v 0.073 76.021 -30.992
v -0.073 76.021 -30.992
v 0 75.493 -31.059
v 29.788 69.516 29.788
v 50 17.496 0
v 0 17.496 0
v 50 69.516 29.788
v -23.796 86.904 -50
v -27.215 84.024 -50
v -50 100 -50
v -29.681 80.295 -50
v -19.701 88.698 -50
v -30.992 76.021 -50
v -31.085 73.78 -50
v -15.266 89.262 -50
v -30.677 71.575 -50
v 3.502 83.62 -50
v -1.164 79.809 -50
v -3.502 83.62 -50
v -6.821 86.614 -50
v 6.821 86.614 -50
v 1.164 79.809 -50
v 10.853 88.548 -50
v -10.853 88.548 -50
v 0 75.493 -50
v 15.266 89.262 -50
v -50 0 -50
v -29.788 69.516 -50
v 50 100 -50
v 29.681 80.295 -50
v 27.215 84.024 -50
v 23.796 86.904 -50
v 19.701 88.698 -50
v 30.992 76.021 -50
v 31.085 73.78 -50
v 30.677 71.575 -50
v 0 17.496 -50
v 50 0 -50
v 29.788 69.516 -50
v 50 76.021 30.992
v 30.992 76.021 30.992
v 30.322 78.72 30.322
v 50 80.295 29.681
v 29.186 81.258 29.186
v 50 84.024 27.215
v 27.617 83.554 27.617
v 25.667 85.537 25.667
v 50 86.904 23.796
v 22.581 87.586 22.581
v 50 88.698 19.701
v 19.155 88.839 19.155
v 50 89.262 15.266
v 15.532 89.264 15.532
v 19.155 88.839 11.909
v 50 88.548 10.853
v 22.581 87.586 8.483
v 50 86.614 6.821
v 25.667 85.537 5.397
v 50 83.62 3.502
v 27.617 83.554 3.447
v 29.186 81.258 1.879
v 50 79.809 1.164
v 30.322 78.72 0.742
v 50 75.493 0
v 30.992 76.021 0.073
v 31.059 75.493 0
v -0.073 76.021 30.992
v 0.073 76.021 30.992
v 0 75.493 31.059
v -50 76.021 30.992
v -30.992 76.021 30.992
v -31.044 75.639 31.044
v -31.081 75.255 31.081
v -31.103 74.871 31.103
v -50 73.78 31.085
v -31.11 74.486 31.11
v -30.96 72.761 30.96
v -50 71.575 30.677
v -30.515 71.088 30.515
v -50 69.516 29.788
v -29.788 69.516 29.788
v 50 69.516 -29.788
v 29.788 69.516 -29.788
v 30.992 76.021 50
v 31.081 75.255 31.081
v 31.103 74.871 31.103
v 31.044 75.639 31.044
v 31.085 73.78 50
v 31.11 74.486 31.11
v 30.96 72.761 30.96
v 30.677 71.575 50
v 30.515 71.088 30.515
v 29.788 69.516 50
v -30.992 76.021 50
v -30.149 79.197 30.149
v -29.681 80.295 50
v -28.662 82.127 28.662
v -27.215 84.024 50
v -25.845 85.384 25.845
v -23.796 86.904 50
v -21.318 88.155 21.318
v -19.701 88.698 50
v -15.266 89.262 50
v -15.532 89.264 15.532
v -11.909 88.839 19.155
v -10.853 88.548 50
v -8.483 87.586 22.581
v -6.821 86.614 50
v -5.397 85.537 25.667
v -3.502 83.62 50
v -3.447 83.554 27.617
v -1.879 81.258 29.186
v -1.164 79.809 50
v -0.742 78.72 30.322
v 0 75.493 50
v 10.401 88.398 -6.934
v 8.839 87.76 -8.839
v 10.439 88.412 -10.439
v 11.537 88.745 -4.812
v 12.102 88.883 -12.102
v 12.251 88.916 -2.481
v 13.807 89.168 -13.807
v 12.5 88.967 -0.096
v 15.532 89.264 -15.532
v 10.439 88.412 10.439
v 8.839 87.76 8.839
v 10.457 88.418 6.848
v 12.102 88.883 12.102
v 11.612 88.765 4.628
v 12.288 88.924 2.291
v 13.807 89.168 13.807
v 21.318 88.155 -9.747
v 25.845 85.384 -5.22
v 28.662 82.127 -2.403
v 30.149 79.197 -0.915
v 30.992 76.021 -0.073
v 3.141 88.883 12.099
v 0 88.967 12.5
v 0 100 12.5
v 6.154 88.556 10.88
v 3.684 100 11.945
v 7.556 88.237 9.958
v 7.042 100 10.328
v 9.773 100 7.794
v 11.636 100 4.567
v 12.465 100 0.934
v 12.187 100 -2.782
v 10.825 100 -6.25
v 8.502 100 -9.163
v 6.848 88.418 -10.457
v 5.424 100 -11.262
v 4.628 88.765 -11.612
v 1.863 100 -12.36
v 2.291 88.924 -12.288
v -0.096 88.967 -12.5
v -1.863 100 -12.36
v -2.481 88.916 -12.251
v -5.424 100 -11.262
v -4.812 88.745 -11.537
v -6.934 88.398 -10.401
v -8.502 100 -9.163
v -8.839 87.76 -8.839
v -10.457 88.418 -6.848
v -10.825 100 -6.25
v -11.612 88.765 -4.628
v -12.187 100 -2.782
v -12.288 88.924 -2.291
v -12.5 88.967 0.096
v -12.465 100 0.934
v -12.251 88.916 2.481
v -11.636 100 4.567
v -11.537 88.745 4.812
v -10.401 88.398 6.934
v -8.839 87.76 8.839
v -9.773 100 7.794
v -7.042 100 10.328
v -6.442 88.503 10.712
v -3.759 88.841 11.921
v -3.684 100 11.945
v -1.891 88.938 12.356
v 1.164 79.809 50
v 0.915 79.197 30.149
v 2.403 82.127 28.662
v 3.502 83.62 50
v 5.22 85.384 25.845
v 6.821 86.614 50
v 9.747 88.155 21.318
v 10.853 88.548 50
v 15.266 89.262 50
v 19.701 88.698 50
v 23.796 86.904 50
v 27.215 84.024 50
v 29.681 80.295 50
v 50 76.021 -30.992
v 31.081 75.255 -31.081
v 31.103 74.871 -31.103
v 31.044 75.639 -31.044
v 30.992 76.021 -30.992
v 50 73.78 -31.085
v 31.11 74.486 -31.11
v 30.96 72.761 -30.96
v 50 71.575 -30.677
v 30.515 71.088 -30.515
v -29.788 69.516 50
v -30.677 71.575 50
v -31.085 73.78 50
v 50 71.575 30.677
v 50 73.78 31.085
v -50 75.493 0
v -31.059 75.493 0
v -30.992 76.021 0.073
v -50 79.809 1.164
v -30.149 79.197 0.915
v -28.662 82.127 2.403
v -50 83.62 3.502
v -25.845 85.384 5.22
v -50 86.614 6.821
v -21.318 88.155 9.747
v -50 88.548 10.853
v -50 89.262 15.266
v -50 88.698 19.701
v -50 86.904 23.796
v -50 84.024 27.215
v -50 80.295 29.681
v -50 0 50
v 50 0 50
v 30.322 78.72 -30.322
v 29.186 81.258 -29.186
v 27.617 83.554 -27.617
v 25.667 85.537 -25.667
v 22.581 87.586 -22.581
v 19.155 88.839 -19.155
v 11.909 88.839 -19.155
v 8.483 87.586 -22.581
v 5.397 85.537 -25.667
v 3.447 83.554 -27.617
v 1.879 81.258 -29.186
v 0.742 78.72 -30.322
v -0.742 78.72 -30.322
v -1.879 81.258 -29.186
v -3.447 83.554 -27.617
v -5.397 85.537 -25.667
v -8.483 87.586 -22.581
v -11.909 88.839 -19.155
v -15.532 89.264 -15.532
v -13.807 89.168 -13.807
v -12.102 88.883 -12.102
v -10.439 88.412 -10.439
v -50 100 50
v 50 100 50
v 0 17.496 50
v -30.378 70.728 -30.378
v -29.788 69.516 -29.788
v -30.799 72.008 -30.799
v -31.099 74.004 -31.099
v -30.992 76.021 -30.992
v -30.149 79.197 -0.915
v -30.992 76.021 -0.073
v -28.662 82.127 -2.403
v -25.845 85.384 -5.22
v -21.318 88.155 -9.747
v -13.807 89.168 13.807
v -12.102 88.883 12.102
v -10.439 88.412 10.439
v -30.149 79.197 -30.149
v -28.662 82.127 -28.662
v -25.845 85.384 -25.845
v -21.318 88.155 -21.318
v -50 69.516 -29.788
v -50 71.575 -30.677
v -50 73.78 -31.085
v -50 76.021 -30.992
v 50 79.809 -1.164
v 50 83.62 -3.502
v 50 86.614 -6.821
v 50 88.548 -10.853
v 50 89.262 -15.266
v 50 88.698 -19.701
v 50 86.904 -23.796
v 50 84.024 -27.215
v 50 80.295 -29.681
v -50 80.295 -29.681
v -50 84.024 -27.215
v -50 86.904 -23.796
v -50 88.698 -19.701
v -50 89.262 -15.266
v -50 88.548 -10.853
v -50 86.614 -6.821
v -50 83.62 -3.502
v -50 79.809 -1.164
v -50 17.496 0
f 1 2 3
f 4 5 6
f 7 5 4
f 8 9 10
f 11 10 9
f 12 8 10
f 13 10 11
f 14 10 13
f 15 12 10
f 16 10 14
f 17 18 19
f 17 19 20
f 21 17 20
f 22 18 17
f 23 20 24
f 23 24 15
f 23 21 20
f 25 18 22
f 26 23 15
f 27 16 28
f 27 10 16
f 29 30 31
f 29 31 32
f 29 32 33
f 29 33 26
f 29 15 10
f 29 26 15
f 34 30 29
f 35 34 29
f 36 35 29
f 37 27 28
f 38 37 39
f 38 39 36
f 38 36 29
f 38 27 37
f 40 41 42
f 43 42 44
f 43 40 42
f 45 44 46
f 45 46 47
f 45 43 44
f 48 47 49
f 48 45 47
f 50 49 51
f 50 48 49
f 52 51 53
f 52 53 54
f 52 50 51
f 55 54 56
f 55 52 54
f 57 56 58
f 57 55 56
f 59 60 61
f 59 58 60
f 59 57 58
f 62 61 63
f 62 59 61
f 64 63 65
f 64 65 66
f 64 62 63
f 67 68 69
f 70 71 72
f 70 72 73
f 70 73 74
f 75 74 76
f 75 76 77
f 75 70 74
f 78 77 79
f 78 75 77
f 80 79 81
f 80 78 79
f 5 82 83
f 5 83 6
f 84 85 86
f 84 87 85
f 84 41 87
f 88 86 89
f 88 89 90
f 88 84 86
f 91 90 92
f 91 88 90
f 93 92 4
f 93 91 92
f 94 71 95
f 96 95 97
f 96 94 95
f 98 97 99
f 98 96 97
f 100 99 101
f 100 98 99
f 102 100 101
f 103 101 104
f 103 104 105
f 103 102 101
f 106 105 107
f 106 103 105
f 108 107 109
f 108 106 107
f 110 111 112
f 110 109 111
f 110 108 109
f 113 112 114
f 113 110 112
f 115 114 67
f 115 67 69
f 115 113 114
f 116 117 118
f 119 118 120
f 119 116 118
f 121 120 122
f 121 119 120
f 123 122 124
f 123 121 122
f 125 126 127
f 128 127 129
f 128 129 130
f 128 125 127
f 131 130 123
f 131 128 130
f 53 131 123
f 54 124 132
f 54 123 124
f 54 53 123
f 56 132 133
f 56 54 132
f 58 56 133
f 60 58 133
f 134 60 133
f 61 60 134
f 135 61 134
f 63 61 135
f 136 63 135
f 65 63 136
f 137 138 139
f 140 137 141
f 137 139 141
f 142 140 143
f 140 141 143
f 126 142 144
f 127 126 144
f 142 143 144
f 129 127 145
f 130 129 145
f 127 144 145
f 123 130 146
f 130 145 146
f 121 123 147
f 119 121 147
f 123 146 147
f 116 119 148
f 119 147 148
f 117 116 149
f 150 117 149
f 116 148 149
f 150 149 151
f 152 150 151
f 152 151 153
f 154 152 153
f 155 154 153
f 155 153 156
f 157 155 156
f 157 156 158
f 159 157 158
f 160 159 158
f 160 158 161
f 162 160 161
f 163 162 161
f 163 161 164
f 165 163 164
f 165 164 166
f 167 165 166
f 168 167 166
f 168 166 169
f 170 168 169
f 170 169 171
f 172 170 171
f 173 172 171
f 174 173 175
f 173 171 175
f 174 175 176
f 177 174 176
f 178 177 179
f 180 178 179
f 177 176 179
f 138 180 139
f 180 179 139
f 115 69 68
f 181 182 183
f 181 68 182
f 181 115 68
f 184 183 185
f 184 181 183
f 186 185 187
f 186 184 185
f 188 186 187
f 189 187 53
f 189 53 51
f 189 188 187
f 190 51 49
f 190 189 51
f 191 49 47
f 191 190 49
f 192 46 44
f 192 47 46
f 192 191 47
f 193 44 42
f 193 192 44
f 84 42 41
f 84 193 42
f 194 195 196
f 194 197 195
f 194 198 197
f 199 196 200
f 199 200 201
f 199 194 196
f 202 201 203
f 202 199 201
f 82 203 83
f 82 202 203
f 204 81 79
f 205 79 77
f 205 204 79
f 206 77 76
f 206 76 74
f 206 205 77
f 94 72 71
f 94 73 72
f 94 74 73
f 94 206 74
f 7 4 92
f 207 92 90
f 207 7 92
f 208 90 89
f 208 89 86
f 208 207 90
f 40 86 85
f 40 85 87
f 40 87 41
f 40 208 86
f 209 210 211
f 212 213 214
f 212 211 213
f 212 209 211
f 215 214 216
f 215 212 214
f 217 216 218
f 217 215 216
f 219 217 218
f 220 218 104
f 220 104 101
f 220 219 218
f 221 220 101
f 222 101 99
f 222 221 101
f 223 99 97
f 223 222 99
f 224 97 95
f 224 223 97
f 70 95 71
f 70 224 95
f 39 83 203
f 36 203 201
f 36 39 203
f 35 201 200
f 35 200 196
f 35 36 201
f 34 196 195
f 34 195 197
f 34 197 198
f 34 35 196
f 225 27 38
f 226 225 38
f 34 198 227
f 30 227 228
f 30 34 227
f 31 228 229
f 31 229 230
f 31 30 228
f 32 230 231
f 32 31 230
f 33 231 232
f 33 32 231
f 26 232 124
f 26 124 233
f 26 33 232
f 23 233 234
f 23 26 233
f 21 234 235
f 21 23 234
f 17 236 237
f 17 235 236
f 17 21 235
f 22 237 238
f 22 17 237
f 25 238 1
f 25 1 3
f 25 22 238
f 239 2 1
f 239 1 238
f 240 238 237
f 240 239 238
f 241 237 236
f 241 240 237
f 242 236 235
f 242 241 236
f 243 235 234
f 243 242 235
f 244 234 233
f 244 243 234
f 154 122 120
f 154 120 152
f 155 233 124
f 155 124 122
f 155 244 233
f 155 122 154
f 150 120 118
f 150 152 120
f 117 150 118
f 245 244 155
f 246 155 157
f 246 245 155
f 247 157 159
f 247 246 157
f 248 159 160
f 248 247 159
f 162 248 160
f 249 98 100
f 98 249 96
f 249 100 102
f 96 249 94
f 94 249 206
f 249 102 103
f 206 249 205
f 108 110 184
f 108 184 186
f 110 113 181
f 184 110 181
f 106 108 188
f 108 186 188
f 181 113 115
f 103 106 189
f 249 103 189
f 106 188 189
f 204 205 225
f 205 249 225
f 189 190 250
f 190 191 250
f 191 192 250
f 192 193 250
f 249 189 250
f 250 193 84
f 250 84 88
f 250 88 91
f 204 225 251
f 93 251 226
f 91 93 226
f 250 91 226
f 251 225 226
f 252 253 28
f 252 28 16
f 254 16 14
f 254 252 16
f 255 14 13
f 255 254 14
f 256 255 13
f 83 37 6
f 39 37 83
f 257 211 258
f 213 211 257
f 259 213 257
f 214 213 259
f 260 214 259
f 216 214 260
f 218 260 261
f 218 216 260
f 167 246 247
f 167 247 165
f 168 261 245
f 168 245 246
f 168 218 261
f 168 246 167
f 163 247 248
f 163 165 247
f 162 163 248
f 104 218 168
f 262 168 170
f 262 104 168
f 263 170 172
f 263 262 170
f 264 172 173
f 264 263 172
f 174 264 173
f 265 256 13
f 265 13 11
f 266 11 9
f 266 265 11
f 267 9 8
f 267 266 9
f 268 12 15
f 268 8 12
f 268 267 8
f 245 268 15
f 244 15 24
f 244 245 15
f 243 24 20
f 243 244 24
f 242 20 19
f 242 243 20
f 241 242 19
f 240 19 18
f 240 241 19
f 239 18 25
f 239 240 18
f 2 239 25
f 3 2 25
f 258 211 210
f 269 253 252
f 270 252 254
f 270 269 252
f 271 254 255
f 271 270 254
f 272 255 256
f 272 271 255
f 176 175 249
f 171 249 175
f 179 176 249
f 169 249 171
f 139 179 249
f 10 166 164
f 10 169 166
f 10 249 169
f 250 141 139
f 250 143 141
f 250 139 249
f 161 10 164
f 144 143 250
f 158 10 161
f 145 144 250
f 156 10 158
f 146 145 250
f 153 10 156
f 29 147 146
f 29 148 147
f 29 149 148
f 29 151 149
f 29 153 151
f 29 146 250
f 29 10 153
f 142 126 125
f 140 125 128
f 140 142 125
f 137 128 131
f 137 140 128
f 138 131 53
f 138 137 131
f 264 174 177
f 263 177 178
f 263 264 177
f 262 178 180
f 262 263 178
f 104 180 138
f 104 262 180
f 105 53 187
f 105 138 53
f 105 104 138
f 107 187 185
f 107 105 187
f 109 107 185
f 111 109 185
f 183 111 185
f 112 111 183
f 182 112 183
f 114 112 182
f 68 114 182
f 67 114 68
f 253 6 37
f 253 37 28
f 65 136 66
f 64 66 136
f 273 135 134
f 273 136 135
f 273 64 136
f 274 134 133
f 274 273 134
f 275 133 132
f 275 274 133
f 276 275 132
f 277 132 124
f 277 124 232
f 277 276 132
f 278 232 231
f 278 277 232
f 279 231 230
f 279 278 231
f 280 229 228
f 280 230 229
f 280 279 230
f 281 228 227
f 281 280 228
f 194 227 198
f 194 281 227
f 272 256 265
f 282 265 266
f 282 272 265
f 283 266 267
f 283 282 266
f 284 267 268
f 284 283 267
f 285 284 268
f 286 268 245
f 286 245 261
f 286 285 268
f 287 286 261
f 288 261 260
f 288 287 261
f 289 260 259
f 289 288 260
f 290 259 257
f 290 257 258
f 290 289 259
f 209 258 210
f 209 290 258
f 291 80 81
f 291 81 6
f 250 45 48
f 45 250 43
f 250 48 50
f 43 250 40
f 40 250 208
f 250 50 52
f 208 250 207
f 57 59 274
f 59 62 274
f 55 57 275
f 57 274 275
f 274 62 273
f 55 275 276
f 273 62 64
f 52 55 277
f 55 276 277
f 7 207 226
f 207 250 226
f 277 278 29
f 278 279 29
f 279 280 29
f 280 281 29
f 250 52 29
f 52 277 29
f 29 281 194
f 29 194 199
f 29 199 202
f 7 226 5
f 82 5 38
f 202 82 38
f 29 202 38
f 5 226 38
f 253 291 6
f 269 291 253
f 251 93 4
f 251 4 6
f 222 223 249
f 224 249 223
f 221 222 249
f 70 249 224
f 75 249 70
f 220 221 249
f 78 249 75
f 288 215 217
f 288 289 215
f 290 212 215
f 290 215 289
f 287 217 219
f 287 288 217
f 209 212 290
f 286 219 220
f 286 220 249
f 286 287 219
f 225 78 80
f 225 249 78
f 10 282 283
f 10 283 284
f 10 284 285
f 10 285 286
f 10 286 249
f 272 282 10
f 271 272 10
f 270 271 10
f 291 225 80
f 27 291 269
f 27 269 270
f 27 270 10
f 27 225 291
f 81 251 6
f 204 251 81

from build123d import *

# Parameters (mm, degrees)
SKETCH1_W           = 100
SKETCH1_H           = 100
BOSS_EXTRUDE1_DEPTH = 100
CUT_EXTRUDE1_DEPTH  = 50
CIRPATTERN2_COUNT   = 4
SKETCH3_R           = 12.5
CUT_EXTRUDE2_DEPTH  = 50


with BuildPart() as part:
    # Sketch1 → Boss-Extrude1 (new body)
    with BuildSketch(Plane(origin=(0, 0, 0), x_dir=(1, 0, 0), z_dir=(0, 1, 0))):
        Rectangle(SKETCH1_W, SKETCH1_H)
    extrude(amount=BOSS_EXTRUDE1_DEPTH)

    # Sketch2 → Cut-Extrude1 (cut)
    with BuildSketch(Plane.XY.offset(50)):
        with BuildLine():
            Line((0, 17.495781671), (-29.788286543, 69.516301586))
            ThreePointArc((-29.788286543, 69.516301586), (-30.943422674, 72.666080294), (-30.99180085, 76.020645087))
            ThreePointArc((-30.99180085, 76.020645087), (-15.265826761, 89.261609896), (0, 75.492661373))
            ThreePointArc((0, 75.492661373), (15.265826761, 89.261609896), (30.99180085, 76.020645087))
            ThreePointArc((30.99180085, 76.020645087), (30.943422674, 72.666080294), (29.788286543, 69.516301586))
            Line((29.788286543, 69.516301586), (0, 17.495781671))
        make_face()
    cut_extrude1 = extrude(amount=-CUT_EXTRUDE1_DEPTH, mode=Mode.SUBTRACT)

    # CirPattern2: Cut-Extrude1 ×4 about axis
    cirpattern2_axis = Axis((0, 105, 0), (0, -1, 0))
    for i in range(1, CIRPATTERN2_COUNT):
        add(cut_extrude1.rotate(cirpattern2_axis, i * 360 / CIRPATTERN2_COUNT), mode=Mode.SUBTRACT)

    # Sketch3 → Cut-Extrude2 (cut)
    with BuildSketch(Plane(origin=(0, 100, 0), x_dir=(1, 0, 0), z_dir=(0, 1, 0))):
        Circle(SKETCH3_R)
    extrude(amount=-CUT_EXTRUDE2_DEPTH, mode=Mode.SUBTRACT)


solid = part.part
